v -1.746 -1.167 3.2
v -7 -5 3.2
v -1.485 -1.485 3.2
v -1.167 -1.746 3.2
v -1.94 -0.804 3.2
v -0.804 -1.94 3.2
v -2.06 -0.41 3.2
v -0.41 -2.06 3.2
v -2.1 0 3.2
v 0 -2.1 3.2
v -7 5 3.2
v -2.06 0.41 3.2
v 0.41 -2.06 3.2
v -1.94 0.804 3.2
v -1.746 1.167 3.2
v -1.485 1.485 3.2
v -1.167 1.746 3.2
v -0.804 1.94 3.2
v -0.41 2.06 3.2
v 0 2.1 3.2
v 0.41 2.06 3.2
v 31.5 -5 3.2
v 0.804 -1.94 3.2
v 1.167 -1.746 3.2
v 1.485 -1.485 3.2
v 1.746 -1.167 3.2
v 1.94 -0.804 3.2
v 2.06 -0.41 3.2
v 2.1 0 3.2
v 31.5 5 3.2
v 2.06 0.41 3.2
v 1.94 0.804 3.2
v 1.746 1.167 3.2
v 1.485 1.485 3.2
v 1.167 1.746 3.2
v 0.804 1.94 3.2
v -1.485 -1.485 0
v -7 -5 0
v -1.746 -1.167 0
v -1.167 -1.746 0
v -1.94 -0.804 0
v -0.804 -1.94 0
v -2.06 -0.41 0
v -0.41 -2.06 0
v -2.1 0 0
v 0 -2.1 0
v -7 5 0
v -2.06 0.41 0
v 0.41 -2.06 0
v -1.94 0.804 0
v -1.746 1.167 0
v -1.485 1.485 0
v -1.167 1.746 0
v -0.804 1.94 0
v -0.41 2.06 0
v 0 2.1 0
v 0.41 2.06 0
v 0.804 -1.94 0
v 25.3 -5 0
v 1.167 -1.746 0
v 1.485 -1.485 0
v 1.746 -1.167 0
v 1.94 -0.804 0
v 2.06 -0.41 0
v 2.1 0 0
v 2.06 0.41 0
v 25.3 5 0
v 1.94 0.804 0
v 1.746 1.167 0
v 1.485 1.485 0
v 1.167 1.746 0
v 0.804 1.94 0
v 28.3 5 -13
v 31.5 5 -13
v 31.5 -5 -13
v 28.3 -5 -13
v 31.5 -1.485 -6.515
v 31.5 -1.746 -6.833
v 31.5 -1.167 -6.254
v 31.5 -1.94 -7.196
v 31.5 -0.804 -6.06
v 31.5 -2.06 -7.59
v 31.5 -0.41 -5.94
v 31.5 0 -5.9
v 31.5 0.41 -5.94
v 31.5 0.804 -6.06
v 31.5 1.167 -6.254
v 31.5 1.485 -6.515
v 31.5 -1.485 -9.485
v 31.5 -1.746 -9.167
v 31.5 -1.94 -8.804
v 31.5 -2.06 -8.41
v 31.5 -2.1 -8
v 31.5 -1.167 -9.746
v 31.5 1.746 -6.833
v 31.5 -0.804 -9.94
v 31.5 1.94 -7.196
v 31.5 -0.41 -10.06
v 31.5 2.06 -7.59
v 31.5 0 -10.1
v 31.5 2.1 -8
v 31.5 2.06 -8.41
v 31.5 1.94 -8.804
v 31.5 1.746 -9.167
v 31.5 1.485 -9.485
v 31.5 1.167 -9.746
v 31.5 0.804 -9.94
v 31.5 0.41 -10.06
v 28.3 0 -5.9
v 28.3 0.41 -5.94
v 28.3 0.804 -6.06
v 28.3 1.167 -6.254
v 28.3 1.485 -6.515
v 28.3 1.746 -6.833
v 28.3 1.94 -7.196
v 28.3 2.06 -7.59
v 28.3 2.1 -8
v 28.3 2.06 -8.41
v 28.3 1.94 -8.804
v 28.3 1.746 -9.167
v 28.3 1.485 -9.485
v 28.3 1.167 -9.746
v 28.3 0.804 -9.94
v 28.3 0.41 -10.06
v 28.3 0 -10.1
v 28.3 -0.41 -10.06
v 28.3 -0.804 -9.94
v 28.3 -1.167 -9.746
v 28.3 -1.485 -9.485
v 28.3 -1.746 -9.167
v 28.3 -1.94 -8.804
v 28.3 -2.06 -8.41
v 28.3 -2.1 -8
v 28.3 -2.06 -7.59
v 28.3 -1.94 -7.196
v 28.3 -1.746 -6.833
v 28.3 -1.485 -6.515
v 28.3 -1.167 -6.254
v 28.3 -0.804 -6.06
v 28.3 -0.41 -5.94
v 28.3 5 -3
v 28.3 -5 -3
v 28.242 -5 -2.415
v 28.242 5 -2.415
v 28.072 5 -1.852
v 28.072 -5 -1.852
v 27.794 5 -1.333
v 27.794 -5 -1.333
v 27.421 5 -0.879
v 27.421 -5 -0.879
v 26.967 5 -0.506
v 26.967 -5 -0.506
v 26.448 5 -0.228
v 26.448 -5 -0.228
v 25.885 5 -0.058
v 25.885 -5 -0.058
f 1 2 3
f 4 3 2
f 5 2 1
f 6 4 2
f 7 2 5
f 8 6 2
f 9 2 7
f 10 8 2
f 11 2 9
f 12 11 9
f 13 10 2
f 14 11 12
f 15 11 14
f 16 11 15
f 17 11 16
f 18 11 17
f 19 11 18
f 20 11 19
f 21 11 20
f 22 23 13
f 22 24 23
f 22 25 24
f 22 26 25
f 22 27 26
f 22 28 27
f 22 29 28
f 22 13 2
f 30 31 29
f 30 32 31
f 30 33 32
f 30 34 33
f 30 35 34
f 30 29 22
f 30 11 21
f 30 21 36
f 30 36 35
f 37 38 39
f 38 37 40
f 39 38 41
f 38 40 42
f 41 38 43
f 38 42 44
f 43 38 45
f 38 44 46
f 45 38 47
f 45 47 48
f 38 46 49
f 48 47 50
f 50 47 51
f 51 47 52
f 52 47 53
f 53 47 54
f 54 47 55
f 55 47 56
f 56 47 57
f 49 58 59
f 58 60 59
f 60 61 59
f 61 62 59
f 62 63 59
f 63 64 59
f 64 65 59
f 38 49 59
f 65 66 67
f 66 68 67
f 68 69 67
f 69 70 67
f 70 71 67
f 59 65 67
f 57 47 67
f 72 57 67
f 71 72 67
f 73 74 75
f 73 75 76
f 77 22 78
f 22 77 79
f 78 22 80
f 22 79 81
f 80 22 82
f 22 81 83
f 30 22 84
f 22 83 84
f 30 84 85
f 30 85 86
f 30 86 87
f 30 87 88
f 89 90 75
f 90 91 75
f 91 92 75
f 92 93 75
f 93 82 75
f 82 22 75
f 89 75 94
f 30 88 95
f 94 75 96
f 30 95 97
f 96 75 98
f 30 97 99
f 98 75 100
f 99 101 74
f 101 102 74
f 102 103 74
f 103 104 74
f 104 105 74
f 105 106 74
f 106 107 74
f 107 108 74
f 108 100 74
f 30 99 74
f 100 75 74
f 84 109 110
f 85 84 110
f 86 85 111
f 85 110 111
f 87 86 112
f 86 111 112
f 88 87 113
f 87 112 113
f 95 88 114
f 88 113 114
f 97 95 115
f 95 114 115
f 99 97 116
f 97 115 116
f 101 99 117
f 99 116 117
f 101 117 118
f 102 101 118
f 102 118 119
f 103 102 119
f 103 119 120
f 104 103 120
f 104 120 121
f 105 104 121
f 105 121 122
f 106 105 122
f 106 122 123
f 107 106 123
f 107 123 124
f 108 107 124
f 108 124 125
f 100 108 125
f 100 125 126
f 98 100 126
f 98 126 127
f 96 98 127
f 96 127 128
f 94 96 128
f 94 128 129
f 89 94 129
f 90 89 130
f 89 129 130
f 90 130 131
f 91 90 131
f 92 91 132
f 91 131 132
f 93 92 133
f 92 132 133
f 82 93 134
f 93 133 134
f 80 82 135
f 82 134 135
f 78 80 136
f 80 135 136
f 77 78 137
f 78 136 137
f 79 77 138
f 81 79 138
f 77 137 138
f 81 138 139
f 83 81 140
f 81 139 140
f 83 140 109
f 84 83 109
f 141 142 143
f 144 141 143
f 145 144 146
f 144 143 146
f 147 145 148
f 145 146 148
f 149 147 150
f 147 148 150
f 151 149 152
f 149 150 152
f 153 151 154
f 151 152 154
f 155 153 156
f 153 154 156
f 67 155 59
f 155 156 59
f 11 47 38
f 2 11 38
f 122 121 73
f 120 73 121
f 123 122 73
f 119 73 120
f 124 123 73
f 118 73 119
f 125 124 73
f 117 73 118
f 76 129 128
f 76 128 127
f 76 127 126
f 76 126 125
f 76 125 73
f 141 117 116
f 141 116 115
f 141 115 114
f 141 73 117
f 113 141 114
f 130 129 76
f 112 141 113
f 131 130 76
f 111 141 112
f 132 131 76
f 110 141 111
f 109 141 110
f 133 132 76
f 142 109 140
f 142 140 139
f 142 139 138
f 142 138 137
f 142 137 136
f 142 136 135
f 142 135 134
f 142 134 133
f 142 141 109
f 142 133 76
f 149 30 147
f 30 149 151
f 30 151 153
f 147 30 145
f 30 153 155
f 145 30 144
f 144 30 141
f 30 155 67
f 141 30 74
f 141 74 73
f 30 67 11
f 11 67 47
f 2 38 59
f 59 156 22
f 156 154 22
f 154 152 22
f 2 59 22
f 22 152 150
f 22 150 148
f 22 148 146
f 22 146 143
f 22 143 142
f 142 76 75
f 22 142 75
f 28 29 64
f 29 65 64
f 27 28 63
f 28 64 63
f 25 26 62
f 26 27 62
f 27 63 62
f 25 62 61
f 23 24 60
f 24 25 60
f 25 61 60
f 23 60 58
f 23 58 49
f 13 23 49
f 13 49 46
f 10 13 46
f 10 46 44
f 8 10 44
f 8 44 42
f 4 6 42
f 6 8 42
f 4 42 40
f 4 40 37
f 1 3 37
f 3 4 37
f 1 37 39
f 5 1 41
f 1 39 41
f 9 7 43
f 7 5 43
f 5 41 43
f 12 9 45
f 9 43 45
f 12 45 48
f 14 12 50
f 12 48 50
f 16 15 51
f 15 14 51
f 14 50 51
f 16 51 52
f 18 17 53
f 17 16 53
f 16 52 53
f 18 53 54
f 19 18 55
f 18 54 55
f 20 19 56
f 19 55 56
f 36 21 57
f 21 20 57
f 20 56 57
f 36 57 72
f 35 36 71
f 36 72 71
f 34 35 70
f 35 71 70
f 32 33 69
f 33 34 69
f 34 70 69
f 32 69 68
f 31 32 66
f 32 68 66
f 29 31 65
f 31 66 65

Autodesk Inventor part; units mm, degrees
ref_plane "YZ Plane" through (0, 0, 0) normal (1, 0, 0) x (0, 1, 0)
ref_plane "XZ Plane" through (0, 0, 0) normal (0, 1, 0) x (-1, 0, 0)
ref_plane "XY Plane" through (0, 0, 0) normal (0, 0, 1) x (1, 0, 0)
sketch "Эскиз1" plane through (0, 0, 0) normal (0, 0, 1) x (1, 0, 0)
  circle A0 centre (0, 0) radius 2.1
  line L0 (-31.5, -5) -> (31.5, -5)
  line L1 (31.5, -5) -> (31.5, 5)
  line L2 (31.5, 5) -> (-31.5, 5)
  line L3 (-31.5, 5) -> (-31.5, -5)
  line L4 (-31.5, -5) -> (31.5, 5) construction
  line L5 (31.5, -5) -> (-31.5, 5) construction
  line L6 (-7, 5) -> (-7, -5)
  dimension "d0" = 4.2
  dimension "d1" = 63
  dimension "d2" = 10
  dimension "d3" = 7
extrude "Выдавливание1" add sketch "Эскиз1" along normal blind 3.2 contours L6 L2 L1 L0
sketch "Эскиз2" plane through (0, 0, 0) normal (0, 0, -1) x (-1, 0, 0)
  line L0 (-31.5, 5) -> (7, 5) projected
  line L1 (7, -5) -> (-31.5, -5) projected
  line L2 (-31.5, 5) -> (-28.3, 5)
  line L3 (-28.3, 5) -> (-28.3, -5)
  line L4 (-28.3, -5) -> (-31.5, -5)
  line L5 (-31.5, -5) -> (-31.5, 5)
  point P0 (0, 0)
  point P1 (-28.3, 5)
  dimension "d6" = 3.2
extrude "Выдавливание2" add sketch "Эскиз2" along normal blind 13
fillet "Сопряжение1" radius 3 1 edges at (28.3, 0, 0)
sketch "Эскиз3" plane through (28.3, -5, -13) normal (-1, 0, 0) x (0, 0, 1)
  line L0 (0, 0) -> (0, 10) projected
  line L1 (0, 5) -> (10, 5)
  line L2 (10, 10) -> (10, 0) projected
  circle A0 centre (5, 5) radius 2.1
  point P0 (13, 5)
  dimension "d10" = 4.2
extrude "Выдавливание3" cut sketch "Эскиз3" against normal blind 13
properties part number "мертвое колесо крепл 2 25-26"
